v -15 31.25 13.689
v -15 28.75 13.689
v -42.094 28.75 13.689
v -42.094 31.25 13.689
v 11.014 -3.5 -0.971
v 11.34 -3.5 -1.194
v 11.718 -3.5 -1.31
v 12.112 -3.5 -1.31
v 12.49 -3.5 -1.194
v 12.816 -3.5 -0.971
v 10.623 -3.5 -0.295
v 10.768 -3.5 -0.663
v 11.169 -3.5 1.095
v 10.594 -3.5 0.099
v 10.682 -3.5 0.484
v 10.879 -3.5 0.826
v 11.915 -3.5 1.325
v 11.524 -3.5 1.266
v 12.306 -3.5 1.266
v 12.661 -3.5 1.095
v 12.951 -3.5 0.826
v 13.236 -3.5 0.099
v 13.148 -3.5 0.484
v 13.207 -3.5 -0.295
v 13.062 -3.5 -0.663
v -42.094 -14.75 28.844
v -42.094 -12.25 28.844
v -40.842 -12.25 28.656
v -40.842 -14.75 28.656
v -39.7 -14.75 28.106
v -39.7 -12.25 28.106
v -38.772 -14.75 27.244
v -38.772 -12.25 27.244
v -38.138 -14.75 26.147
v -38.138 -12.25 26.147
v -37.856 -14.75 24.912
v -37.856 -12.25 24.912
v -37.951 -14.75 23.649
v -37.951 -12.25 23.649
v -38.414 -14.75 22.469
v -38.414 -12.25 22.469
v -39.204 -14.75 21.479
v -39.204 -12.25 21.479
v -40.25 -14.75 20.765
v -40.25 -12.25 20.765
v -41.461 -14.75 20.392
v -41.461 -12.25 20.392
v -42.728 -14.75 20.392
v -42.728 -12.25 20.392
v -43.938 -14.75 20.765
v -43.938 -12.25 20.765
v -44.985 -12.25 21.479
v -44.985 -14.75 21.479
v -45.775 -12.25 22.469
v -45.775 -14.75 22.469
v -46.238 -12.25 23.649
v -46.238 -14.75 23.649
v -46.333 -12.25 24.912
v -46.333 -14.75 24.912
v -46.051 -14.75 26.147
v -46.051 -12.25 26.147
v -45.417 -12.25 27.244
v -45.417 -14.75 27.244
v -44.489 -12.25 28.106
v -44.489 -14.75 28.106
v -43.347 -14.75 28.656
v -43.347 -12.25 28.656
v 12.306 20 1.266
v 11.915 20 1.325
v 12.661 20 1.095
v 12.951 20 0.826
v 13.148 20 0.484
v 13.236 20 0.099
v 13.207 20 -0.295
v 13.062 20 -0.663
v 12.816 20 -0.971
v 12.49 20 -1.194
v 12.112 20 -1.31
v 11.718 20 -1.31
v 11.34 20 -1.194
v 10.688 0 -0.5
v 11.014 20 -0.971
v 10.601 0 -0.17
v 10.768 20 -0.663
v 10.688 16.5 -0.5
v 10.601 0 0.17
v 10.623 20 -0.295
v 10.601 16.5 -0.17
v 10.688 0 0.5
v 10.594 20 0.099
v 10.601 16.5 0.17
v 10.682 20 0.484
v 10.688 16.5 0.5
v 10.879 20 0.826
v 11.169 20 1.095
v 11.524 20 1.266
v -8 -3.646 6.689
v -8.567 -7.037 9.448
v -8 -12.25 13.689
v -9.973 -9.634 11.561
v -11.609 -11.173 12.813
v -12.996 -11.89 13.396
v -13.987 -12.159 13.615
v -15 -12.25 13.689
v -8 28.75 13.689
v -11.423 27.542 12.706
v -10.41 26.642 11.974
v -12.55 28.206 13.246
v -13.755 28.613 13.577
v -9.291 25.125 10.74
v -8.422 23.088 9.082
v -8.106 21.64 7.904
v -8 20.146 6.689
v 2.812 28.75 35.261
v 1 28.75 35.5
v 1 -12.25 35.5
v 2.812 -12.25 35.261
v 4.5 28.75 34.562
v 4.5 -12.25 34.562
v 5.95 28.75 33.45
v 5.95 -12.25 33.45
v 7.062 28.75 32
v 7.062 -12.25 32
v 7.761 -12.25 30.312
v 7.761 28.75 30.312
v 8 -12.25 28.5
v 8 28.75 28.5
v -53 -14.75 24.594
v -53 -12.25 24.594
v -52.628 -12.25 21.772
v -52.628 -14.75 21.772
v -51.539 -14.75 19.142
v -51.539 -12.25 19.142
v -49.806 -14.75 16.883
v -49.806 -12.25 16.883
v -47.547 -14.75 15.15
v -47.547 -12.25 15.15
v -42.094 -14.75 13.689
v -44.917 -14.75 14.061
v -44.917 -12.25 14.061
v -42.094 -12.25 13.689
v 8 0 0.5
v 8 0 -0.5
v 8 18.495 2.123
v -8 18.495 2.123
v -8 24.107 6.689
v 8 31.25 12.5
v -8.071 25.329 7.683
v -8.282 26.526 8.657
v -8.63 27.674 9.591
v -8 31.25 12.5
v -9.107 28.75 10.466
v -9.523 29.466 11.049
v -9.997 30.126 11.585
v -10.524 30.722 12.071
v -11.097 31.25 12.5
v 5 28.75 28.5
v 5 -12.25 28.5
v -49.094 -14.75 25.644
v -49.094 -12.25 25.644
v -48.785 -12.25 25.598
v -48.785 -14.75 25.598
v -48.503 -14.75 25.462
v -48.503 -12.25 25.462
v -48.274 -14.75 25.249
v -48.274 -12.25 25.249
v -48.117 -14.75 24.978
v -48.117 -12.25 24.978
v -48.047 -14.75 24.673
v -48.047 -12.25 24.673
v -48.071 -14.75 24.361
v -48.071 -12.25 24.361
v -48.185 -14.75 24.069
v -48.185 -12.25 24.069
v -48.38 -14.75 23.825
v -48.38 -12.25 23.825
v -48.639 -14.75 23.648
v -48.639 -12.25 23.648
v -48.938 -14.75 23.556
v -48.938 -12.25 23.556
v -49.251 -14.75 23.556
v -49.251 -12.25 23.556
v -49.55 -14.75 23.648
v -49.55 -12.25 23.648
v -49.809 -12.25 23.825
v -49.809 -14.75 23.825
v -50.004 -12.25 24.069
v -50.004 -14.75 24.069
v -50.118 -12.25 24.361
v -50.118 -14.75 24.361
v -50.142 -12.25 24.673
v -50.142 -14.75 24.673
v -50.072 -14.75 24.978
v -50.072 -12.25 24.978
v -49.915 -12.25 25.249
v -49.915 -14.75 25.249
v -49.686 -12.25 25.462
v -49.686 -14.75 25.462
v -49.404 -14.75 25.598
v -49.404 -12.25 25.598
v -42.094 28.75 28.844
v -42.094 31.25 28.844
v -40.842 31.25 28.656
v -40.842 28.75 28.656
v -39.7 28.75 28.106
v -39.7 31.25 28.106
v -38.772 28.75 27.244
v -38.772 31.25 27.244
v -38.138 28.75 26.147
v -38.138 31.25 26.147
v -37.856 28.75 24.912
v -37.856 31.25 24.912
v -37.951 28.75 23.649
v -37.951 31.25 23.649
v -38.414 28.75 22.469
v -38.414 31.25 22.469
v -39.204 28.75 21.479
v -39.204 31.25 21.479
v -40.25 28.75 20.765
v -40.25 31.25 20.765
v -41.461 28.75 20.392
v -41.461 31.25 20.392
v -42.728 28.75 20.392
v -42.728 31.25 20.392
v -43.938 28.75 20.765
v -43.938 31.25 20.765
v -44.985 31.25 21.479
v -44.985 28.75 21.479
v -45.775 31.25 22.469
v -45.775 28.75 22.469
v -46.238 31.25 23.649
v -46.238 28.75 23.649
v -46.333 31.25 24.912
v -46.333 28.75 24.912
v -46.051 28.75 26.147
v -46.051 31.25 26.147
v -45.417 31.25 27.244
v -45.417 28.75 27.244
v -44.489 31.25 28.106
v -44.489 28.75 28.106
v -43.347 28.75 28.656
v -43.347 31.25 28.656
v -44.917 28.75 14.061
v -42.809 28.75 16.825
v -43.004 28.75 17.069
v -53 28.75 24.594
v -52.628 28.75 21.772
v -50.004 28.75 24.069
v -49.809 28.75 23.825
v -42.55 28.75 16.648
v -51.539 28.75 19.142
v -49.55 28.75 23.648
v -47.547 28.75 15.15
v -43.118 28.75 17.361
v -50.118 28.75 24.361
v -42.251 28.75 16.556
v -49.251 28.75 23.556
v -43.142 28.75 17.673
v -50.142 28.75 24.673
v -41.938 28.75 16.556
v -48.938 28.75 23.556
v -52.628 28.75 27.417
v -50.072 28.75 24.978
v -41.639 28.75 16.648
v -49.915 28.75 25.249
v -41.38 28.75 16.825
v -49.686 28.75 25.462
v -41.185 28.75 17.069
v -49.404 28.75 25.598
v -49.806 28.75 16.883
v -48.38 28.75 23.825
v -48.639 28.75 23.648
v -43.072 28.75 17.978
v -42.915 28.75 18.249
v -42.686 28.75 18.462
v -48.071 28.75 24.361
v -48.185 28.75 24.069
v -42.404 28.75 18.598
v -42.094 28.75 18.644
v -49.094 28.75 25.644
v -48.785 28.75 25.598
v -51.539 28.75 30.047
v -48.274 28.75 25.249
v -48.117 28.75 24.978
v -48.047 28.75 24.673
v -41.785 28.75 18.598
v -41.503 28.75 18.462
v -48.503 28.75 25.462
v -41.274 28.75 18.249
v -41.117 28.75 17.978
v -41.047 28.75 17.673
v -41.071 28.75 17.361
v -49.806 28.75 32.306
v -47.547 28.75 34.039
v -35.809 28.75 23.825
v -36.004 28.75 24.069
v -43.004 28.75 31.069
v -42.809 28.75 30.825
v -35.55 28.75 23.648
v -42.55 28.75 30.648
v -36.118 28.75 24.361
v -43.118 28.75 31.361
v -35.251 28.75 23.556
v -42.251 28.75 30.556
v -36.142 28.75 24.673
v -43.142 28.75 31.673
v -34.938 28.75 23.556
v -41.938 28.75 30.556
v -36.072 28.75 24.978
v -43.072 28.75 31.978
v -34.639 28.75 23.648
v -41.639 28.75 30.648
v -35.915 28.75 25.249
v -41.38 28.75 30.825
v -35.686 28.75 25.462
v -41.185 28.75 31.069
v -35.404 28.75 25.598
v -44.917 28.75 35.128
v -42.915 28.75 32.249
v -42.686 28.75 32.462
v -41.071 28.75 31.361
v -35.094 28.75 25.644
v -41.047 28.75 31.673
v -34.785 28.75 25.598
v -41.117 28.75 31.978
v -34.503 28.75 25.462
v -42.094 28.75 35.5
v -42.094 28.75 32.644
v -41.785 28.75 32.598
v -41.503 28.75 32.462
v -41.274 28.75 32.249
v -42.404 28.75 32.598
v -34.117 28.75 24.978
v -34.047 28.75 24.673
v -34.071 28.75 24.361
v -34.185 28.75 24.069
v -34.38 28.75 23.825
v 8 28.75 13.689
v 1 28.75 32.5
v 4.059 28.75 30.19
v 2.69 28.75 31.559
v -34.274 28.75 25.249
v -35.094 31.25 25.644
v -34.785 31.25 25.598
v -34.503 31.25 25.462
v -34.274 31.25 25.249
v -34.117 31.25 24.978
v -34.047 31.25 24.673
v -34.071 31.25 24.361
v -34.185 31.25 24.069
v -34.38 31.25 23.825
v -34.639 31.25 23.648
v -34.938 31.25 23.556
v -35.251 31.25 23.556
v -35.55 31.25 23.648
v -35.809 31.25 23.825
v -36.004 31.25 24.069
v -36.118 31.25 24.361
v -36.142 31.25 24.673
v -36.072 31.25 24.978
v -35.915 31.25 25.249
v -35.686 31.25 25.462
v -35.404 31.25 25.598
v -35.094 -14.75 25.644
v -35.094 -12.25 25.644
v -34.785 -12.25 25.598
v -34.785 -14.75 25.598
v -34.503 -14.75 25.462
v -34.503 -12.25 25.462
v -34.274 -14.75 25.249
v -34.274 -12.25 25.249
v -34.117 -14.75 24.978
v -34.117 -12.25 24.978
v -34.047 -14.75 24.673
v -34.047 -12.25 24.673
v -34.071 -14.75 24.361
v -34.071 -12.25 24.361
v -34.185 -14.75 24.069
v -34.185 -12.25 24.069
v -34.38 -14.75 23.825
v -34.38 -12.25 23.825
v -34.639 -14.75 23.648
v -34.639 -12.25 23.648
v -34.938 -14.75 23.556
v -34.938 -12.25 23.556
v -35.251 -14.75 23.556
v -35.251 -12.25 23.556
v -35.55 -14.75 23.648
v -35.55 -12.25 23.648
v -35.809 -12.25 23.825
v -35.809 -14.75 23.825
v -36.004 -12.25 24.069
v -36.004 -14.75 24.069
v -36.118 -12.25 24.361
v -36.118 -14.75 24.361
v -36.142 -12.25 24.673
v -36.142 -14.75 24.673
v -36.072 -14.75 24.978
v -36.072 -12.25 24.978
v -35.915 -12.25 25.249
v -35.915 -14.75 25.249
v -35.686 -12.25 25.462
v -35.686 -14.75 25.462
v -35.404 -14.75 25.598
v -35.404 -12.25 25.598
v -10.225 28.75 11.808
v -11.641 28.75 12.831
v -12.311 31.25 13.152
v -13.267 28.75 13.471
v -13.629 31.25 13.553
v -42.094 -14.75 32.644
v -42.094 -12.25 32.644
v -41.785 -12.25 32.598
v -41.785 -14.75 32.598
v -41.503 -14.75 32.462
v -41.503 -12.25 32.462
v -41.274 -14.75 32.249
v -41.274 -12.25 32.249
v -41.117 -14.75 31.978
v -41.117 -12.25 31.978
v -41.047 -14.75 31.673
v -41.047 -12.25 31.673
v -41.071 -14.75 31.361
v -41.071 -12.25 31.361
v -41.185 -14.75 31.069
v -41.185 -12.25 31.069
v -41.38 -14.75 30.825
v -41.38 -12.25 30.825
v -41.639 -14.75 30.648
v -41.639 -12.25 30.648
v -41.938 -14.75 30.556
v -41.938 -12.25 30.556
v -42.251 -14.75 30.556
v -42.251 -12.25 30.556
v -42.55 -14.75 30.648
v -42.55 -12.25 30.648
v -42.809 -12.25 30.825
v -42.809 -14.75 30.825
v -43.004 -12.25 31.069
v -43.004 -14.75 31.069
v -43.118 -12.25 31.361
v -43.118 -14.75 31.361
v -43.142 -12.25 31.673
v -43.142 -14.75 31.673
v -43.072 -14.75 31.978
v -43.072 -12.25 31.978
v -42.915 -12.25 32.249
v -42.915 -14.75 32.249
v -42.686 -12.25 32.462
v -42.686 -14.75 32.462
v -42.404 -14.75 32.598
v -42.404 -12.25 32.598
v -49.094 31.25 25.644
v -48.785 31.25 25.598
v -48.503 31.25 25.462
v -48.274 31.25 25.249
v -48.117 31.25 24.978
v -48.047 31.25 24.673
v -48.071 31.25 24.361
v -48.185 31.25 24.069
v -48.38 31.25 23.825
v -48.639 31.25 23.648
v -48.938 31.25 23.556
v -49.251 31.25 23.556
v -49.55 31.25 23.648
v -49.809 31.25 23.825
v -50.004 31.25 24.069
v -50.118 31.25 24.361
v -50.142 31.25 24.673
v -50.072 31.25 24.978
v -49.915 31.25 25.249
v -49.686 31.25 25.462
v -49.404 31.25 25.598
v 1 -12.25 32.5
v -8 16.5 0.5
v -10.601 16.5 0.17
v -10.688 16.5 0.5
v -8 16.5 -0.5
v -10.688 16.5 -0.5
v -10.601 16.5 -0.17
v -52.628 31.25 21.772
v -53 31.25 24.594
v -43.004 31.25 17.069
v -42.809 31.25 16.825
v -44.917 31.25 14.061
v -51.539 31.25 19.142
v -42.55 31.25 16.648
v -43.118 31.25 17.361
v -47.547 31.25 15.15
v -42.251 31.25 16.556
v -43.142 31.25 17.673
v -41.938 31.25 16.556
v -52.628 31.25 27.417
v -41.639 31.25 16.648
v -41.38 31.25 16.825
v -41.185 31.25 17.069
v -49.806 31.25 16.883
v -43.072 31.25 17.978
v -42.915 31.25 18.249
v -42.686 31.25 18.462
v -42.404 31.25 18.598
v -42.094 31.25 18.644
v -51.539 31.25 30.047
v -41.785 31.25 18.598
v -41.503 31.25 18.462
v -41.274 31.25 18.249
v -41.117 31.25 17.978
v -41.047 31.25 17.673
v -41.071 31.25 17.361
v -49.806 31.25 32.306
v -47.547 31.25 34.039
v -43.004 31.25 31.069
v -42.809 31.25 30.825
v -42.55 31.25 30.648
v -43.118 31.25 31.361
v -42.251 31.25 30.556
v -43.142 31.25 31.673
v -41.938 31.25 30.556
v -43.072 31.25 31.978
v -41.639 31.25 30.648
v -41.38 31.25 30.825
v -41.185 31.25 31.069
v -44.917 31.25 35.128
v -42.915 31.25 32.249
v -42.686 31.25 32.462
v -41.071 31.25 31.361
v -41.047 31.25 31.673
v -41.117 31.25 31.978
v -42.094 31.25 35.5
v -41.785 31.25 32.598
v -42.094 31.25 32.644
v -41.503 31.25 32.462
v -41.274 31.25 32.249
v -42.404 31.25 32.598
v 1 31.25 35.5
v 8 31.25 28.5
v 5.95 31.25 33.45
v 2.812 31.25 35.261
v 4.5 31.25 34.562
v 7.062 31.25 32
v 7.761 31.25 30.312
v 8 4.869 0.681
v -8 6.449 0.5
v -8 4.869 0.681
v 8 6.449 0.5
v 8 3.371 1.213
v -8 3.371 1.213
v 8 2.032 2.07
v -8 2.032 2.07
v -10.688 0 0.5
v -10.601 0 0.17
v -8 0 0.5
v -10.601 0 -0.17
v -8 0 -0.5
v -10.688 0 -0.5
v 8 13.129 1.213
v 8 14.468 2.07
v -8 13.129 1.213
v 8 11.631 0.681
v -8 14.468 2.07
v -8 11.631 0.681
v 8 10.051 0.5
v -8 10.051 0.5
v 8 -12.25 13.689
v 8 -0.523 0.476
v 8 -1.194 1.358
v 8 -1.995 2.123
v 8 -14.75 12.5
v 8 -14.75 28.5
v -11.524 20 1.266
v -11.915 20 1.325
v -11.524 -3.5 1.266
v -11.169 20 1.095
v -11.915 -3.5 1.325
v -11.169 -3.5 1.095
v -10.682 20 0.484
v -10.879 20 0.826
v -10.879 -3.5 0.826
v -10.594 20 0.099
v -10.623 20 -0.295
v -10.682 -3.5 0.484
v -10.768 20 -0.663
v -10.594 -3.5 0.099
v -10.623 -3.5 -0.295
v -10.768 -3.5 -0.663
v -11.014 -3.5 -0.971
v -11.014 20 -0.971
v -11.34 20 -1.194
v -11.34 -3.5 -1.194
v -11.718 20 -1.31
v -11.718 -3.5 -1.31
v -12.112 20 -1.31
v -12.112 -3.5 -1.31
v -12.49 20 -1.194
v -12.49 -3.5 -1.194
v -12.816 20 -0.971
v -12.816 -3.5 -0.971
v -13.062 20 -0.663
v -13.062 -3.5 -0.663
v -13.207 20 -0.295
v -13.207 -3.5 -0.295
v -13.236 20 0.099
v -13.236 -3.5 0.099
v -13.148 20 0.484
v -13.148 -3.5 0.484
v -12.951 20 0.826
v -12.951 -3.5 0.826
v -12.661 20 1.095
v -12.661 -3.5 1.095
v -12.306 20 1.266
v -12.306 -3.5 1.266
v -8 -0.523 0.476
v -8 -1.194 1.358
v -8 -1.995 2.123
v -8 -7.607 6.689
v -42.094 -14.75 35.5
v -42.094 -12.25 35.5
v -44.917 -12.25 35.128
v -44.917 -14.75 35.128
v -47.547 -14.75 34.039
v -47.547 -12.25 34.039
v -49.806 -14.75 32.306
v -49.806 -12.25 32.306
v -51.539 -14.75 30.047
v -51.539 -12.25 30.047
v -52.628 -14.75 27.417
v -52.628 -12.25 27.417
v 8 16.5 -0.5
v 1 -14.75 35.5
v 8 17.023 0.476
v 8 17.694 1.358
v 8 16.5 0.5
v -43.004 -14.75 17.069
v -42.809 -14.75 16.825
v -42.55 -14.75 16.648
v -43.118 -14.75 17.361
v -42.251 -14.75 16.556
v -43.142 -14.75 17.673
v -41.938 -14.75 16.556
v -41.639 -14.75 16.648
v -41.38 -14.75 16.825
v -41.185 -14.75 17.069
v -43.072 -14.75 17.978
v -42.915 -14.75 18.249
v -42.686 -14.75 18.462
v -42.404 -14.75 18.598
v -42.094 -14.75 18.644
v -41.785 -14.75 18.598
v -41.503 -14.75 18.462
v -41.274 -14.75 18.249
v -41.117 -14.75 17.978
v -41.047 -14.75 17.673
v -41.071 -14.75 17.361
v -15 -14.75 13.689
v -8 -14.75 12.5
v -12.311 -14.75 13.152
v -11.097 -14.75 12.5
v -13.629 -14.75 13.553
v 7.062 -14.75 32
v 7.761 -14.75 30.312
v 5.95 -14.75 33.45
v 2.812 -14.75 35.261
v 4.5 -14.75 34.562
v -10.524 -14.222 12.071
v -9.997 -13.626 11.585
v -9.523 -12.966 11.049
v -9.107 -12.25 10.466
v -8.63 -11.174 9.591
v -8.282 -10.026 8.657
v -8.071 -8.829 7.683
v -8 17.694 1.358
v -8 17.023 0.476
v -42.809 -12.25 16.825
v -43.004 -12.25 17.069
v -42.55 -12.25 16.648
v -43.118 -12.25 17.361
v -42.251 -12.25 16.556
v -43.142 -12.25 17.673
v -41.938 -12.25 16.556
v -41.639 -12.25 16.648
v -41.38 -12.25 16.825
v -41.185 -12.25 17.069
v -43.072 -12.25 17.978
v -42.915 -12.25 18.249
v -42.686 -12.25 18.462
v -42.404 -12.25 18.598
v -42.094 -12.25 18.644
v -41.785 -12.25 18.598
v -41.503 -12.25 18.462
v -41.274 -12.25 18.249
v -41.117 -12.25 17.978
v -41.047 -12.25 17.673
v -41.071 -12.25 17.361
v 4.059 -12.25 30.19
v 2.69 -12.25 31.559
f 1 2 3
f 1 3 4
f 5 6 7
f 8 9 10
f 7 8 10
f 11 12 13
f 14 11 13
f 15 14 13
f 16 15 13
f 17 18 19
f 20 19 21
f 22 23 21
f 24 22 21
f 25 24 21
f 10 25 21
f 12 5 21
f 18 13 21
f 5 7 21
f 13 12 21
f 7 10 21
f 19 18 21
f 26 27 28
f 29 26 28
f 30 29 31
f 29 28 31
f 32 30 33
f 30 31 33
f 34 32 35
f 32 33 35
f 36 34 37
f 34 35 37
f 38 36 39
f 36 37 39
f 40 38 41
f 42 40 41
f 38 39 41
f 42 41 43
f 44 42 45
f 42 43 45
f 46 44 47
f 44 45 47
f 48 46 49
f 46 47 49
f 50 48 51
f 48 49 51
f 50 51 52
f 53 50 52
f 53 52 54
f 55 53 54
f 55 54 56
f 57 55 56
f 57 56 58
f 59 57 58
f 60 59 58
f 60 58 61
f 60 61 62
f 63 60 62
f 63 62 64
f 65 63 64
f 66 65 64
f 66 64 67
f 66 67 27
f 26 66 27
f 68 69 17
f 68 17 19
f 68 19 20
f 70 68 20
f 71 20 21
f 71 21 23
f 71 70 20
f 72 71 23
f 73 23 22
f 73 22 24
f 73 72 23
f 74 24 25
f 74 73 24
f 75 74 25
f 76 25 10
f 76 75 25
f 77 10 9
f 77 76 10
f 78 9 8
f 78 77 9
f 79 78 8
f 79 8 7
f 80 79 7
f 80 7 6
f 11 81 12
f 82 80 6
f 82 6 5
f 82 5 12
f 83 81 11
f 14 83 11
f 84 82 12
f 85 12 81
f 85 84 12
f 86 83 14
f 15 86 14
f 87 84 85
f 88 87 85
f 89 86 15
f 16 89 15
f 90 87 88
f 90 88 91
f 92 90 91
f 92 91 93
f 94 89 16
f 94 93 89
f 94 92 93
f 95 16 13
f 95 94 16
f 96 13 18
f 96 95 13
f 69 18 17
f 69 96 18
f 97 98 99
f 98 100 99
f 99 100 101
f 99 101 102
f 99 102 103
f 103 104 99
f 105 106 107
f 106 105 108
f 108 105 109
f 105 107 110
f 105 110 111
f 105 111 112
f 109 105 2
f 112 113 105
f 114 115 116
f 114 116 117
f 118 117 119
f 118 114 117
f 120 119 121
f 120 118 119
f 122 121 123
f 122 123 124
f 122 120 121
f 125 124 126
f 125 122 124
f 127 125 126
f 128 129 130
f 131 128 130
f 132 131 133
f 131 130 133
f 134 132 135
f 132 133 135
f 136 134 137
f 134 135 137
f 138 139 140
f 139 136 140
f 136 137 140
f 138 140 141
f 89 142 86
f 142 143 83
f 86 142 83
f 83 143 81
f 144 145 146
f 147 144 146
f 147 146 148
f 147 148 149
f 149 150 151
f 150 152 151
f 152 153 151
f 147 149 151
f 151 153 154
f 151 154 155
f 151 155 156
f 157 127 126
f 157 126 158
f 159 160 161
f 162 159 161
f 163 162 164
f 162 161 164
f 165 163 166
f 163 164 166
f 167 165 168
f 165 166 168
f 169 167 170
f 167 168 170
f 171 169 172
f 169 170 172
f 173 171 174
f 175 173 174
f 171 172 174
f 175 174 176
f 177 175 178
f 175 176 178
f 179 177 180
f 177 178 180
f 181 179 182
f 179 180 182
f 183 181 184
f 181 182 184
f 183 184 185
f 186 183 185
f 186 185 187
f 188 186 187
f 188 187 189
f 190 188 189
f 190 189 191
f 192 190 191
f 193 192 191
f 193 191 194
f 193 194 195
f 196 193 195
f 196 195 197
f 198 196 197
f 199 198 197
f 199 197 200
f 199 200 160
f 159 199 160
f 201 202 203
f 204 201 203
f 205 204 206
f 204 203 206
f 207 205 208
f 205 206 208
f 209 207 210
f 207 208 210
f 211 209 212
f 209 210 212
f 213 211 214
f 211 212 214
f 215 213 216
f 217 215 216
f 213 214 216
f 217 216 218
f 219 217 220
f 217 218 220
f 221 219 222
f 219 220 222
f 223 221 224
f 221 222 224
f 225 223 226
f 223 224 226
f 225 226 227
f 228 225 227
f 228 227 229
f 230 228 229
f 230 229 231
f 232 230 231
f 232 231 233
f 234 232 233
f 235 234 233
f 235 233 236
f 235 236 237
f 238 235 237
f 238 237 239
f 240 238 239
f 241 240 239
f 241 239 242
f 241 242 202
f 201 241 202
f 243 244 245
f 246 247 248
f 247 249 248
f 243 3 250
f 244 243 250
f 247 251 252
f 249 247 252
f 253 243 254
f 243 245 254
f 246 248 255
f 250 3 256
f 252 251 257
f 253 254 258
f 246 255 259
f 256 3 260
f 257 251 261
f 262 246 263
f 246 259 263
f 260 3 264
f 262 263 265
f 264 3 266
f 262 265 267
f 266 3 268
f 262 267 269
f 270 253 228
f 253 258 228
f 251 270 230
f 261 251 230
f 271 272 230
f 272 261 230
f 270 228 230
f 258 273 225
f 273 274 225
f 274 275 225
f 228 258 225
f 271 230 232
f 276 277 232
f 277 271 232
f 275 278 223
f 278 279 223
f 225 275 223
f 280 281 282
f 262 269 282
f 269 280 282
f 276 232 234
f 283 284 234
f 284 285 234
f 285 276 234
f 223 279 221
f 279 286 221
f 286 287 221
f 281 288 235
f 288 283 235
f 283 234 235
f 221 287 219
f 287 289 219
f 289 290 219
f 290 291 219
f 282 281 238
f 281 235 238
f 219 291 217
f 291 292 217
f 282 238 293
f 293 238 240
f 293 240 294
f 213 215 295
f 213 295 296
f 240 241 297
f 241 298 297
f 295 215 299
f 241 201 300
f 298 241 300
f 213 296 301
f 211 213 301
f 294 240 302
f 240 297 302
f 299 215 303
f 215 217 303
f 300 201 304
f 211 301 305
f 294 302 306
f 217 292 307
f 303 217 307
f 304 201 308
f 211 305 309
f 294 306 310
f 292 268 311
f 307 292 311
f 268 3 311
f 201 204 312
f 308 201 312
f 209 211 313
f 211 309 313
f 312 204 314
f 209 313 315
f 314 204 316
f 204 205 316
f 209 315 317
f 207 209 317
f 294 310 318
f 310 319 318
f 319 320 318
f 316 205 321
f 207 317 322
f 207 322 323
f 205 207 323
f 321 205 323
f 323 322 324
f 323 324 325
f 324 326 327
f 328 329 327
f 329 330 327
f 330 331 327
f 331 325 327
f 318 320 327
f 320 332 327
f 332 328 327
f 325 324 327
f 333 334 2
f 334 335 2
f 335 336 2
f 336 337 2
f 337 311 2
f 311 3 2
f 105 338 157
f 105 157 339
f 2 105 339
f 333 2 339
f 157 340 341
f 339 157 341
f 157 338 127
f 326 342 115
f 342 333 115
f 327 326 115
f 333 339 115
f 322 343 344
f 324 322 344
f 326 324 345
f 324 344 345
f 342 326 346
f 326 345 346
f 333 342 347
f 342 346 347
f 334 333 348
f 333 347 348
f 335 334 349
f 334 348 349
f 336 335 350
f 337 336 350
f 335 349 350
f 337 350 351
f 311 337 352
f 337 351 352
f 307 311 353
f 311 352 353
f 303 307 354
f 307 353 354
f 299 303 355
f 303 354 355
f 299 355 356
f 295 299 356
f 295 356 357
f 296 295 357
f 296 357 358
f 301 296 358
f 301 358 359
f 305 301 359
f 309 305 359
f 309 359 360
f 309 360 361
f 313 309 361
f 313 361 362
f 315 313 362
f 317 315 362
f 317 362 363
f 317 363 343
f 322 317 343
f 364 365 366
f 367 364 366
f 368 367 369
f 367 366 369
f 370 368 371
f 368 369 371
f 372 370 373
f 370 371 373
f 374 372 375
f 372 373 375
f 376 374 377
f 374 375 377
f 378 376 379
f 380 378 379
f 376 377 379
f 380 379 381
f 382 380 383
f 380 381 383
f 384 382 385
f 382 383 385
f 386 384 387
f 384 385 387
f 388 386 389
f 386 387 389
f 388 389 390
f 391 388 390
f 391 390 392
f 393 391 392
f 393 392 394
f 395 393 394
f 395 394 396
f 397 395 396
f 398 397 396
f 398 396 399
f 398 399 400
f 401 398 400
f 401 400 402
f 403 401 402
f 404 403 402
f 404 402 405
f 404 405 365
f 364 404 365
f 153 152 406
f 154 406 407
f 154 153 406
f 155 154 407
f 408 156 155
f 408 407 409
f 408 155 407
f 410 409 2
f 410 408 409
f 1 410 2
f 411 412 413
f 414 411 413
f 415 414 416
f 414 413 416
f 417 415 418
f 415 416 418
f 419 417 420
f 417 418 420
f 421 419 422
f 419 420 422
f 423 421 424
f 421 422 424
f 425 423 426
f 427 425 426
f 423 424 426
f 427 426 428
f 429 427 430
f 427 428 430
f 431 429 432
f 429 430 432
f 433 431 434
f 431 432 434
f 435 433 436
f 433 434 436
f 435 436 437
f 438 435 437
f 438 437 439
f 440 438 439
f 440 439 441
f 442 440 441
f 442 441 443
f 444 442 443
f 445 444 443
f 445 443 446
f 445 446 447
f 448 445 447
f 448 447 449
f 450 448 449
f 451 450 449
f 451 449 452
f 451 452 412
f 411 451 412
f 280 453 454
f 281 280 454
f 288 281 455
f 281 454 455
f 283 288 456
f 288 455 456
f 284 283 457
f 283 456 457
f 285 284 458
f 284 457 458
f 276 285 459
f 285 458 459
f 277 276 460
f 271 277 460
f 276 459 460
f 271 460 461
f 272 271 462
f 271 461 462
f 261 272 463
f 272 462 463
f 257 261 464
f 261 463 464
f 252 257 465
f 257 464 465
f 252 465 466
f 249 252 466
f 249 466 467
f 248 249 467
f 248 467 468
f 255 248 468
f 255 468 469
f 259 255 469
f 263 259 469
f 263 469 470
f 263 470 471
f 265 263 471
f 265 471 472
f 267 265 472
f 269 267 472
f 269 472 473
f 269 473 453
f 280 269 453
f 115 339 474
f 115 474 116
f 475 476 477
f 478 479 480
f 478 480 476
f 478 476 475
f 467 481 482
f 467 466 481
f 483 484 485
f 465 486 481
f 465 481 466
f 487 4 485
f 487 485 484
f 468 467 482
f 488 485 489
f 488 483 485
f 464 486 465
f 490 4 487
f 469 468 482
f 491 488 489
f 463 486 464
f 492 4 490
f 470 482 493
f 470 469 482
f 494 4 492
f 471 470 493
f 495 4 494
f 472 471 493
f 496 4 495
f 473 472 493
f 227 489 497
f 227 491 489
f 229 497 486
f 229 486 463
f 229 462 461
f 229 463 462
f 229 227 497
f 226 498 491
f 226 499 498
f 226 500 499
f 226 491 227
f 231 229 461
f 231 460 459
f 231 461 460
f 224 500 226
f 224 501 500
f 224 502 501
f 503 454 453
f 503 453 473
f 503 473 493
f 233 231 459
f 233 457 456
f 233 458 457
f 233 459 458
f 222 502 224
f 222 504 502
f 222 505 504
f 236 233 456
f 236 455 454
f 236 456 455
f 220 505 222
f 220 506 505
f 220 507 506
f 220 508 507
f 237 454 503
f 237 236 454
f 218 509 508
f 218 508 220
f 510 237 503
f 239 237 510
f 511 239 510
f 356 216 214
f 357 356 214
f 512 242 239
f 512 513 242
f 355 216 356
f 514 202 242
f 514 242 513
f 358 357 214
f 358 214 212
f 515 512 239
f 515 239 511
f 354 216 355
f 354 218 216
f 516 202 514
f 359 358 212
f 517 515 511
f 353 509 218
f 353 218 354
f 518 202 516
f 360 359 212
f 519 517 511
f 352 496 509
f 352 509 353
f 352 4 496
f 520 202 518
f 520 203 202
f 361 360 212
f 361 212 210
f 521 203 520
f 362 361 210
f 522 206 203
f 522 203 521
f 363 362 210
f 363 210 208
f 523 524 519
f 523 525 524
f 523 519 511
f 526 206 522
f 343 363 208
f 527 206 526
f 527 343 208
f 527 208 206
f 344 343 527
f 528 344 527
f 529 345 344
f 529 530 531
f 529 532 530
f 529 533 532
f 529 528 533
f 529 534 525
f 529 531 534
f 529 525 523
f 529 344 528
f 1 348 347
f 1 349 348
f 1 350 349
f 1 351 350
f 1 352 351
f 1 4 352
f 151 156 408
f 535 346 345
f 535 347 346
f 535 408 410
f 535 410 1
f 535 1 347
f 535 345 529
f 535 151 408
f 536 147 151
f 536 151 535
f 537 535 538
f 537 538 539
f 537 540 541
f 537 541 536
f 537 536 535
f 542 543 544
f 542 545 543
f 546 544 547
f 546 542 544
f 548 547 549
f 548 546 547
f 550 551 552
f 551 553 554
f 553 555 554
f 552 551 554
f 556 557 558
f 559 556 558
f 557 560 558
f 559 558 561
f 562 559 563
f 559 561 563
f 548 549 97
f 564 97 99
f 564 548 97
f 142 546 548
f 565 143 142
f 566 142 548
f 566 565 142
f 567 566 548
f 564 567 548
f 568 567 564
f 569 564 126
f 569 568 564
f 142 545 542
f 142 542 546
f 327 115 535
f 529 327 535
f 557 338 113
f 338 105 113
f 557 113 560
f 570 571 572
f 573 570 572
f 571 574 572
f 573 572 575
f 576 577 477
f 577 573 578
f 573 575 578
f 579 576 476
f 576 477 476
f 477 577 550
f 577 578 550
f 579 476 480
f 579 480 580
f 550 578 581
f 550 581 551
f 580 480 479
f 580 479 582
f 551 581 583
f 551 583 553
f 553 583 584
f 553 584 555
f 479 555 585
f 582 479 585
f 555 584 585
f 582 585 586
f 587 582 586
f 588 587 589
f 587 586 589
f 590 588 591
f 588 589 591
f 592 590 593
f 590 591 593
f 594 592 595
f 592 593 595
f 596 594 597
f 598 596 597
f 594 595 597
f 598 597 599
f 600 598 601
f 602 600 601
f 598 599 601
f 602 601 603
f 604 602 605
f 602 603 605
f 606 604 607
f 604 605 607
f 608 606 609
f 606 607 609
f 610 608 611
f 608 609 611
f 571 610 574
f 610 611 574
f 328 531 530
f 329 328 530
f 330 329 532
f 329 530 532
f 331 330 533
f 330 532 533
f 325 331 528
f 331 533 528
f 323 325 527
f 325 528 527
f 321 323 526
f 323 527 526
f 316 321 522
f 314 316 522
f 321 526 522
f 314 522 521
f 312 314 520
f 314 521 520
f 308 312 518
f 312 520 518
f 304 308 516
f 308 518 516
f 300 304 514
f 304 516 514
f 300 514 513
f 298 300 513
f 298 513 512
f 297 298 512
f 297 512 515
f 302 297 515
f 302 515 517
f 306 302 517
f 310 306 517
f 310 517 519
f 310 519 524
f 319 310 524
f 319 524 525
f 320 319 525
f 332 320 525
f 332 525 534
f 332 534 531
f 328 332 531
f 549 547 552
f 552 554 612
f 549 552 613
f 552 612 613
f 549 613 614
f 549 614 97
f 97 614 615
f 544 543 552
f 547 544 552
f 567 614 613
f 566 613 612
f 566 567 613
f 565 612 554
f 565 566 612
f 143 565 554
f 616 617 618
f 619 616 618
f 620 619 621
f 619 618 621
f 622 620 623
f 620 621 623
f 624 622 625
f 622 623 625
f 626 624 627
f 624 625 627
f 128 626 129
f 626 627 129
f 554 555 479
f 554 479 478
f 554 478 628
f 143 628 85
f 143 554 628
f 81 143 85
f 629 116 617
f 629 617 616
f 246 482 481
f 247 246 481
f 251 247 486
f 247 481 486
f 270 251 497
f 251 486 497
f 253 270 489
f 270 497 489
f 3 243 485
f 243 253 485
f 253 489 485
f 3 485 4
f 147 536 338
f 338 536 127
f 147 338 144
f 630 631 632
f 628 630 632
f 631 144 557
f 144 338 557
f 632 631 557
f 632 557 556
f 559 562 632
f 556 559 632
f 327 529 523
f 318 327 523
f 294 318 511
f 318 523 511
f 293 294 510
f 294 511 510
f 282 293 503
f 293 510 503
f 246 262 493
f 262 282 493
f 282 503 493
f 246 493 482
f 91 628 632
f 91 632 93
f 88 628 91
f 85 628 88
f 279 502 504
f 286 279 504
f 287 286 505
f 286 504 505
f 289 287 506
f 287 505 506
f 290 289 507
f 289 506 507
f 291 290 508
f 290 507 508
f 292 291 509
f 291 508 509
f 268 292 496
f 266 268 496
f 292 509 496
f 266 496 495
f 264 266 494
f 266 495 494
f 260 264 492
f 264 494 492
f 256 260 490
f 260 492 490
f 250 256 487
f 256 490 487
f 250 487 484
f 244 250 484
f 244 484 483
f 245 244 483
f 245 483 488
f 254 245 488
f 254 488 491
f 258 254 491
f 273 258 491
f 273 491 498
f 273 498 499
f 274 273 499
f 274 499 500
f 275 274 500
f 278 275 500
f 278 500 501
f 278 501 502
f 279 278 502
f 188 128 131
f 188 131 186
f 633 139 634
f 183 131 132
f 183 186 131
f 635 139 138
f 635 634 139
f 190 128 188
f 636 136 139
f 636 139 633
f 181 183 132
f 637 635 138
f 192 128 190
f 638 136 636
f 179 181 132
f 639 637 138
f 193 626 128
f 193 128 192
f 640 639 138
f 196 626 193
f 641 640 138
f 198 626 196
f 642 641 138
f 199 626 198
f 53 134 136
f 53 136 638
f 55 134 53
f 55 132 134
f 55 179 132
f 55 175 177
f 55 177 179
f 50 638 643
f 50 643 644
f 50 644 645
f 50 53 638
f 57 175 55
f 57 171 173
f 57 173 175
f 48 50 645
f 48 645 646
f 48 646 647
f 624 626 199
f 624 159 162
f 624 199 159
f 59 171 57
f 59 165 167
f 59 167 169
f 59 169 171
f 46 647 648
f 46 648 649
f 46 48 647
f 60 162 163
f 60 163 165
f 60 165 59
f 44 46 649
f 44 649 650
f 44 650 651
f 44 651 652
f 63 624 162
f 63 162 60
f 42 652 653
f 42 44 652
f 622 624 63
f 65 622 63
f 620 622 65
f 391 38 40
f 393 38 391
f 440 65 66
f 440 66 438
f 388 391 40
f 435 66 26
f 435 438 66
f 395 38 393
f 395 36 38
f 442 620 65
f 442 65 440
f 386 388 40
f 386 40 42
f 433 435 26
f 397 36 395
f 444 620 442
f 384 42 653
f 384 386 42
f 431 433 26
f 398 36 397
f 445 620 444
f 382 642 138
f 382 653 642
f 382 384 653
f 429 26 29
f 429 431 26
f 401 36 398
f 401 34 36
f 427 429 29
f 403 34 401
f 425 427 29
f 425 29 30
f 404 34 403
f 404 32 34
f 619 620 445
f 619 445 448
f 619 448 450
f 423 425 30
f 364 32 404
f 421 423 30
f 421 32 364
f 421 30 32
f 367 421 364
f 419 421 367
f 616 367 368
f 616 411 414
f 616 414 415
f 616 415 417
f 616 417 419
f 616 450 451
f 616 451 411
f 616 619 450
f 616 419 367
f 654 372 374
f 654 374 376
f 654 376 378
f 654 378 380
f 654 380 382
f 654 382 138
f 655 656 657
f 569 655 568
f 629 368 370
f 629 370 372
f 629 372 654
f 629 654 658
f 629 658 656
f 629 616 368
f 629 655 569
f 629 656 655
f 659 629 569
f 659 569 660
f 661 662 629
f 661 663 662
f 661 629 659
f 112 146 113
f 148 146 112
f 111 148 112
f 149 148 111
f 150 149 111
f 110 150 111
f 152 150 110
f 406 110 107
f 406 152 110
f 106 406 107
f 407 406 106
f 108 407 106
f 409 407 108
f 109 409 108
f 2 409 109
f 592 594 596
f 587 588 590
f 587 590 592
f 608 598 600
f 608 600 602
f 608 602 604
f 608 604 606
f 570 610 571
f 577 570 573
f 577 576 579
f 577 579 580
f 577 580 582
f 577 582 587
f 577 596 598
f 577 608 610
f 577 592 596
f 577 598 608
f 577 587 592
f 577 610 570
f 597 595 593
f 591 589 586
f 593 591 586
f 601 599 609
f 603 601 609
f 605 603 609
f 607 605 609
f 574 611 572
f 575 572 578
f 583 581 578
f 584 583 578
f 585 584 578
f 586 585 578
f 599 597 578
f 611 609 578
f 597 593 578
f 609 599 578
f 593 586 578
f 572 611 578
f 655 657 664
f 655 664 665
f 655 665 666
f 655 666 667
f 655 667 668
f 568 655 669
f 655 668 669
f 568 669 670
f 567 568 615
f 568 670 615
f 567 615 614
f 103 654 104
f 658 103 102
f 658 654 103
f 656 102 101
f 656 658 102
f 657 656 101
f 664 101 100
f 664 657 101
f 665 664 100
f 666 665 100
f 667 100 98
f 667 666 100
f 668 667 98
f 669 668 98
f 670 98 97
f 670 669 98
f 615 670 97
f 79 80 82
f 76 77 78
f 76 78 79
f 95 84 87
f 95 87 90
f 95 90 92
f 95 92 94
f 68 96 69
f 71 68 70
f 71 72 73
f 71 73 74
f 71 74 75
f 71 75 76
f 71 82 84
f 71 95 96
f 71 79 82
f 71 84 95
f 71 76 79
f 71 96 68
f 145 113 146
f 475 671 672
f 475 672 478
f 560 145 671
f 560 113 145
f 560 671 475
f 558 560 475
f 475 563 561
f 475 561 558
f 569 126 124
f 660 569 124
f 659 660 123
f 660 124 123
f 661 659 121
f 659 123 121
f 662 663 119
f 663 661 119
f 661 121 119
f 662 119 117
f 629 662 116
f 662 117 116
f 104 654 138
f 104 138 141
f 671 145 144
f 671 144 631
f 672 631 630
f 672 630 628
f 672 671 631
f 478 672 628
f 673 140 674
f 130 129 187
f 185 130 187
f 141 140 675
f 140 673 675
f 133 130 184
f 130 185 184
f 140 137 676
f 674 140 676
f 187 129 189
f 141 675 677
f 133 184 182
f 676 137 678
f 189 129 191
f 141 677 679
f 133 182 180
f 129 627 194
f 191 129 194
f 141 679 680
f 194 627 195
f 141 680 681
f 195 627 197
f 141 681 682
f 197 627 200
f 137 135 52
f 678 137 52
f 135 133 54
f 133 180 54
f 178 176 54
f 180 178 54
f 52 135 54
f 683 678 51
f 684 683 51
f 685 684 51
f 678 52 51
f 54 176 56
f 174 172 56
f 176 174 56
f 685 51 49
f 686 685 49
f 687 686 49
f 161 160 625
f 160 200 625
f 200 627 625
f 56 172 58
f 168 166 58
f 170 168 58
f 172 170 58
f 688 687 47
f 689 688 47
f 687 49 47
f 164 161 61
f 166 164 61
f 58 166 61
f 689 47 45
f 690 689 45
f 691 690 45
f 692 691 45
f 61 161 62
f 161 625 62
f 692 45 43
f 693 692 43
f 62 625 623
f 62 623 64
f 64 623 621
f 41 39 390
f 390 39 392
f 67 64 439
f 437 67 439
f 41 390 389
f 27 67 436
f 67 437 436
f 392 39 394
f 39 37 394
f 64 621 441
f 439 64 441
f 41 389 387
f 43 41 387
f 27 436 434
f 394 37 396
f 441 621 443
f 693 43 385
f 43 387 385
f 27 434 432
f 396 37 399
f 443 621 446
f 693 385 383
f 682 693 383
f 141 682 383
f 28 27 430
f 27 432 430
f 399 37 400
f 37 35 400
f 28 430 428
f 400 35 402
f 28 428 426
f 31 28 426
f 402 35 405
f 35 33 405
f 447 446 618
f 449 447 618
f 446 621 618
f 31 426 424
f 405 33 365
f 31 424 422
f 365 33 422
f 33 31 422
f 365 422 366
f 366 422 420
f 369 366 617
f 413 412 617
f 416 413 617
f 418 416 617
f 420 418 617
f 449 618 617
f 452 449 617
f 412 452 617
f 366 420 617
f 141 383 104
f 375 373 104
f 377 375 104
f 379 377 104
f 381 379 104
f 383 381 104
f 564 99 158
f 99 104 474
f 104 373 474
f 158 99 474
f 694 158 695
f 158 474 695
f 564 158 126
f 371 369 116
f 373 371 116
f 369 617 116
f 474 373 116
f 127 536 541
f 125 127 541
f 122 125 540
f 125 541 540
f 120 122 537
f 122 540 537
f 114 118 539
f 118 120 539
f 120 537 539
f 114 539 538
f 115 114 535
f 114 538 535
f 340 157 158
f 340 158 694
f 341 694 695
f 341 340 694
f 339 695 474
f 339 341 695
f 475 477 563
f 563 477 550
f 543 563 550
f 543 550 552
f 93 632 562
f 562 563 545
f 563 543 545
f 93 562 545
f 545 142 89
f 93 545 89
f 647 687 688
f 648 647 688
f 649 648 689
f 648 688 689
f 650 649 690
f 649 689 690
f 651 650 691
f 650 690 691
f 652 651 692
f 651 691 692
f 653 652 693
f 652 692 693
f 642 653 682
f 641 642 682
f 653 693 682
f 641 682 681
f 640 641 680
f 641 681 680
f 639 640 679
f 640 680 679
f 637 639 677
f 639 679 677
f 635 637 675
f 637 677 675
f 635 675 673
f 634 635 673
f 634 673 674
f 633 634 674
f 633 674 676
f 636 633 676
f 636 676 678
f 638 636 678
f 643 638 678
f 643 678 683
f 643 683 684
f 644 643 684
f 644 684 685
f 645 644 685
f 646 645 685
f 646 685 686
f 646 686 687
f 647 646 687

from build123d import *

# Parameters (mm, degrees)
SKETCH1_W           = 23.83
SKETCH1_H           = 1
BOSS_EXTRUDE1_DEPTH = 16.5
SKETCH2_R           = 1.325
BOSS_EXTRUDE2_DEPTH = 11.75
BOSS_EXTRUDE4_DEPTH = 8
SKETCH5_W           = 21.811051378
SKETCH5_H           = 2.5
BOSS_EXTRUDE5_DEPTH = 45
SKETCH6_R           = 4.25
SKETCH6_R_2         = 1.05
CUT_EXTRUDE1_DEPTH  = 79.646360374
FILLET1_R           = 7
FILLET2_R           = 7
FILLET3_R           = 7
BOSS_EXTRUDE6_START = 41
BOSS_EXTRUDE6_DEPTH = 41


with BuildPart() as part:
    # Sketch1 → Boss-Extrude1 (new body)
    with BuildSketch(Plane(origin=(0, 0, 0), x_dir=(1, 0, 0), z_dir=(0, 1, 0))):
        Rectangle(SKETCH1_W, SKETCH1_H)
    extrude(amount=BOSS_EXTRUDE1_DEPTH)

    # Sketch2 → Boss-Extrude2 (add, symmetric)
    with BuildSketch(Plane(origin=(0, 8.25, 0), x_dir=(1, 0, 0), z_dir=(0, 1, 0))):
        with Locations(Location((-11.915, 0, 0), (0, 0, 270))):
            Circle(SKETCH2_R)
        with Locations(Location((11.915, 0, 0), (0, 0, 270))):
            Circle(SKETCH2_R)
    extrude(amount=BOSS_EXTRUDE2_DEPTH, both=True)

    # Sketch4 → Boss-Extrude4 (add, symmetric)
    with BuildSketch(Plane(origin=(0, 0, 0), x_dir=(0, 0, -1), z_dir=(1, 0, 0))):
        Polygon((-0.5, 12.538583985), (-0.5, 16.5), (-12.5, 31.25), (-35.5, 31.25), (-35.5, 28.75), (-13.688948622, 28.75), align=None)
        Polygon((-0.5, 0), (-0.5, 3.961416015), (-13.688948622, -12.25), (-35.5, -12.25), (-35.5, -14.75), (-12.5, -14.75), align=None)
    extrude(amount=BOSS_EXTRUDE4_DEPTH, both=True)

    # Sketch5 → Boss-Extrude5 (add)
    with BuildSketch(Plane.ZY.offset(8)):
        with Locations((24.594474311, 30)):
            Rectangle(SKETCH5_W, SKETCH5_H)
        with Locations((24.594474311, -13.5)):
            Rectangle(SKETCH5_W, SKETCH5_H)
    extrude(amount=BOSS_EXTRUDE5_DEPTH)

    # Sketch6 → Cut-Extrude1 (cut, through all)
    with BuildSketch(Plane(origin=(0, 31.25, 0), x_dir=(1, 0, 0), z_dir=(0, 1, 0))):
        with Locations(Location((-42.094474311, -24.594474311, 0), (0, 0, 270))):
            Circle(SKETCH6_R)
        with Locations(Location((-49.094474311, -24.594474311, 0), (0, 0, 270))):
            Circle(SKETCH6_R_2)
        with Locations(Location((-42.094474311, -17.594474311, 0), (0, 0, 270))):
            Circle(SKETCH6_R_2)
        with Locations(Location((-35.094474311, -24.594474311, 0), (0, 0, 270))):
            Circle(SKETCH6_R_2)
        with Locations(Location((-42.094474311, -31.594474311, 0), (0, 0, 270))):
            Circle(SKETCH6_R_2)
        with BuildLine():
            ThreePointArc((-53, -24.594474311), (-49.805845478, -16.883103144), (-42.094474311, -13.688948622))
            Line((-42.094474311, -13.688948622), (-53, -13.688948622))
            Line((-53, -13.688948622), (-53, -24.594474311))
        make_face()
        with BuildLine():
            ThreePointArc((-42.094474311, -35.5), (-49.805845478, -32.305845478), (-53, -24.594474311))
            Line((-53, -24.594474311), (-53, -35.5))
            Line((-53, -35.5), (-42.094474311, -35.5))
        make_face()
    extrude(amount=-CUT_EXTRUDE1_DEPTH, mode=Mode.SUBTRACT)

    # Fillet1
    # the kernel refuses this fillet: 7 mm, written as the material it adds along each edge
    with BuildSketch(Plane(origin=(-8, -14.75, 13.688948622), x_dir=(-1, 0, 0), z_dir=(0, 1, 0))) as fillet1_piece_1_section:
        with BuildLine():
            CenterArc((FILLET1_R, -FILLET1_R), FILLET1_R, 90, 90)
            Line((0, -FILLET1_R), (0, 0))
            Line((0, 0), (FILLET1_R, 0))
        make_face()
    fillet1_piece_1 = extrude(amount=2.5, mode=Mode.PRIVATE)
    fillet1_piece_1 = split(fillet1_piece_1, bisect_by=Plane(origin=(-10.031790315, -14.125351158, 11.991811112), z_dir=(0, 0.6310874674162202, 0.7757116786991036)), keep=Keep.TOP, mode=Mode.PRIVATE)
    fillet1_piece_1 = split(fillet1_piece_1, bisect_by=Plane(origin=(-10.031790315, -12.54763249, 13.931090308), z_dir=(0, -0.6310874674162201, -0.7757116786991036)), keep=Keep.TOP, mode=Mode.PRIVATE)
    add(fillet1_piece_1)
    with BuildSketch(Plane(origin=(-8, -14.75, 13.688948622), x_dir=(-1, 0, 0), z_dir=(0, 1, 0))) as fillet1_piece_2_section:
        with BuildLine():
            CenterArc((FILLET1_R, -FILLET1_R), FILLET1_R, 90, 90)
            Line((0, -FILLET1_R), (0, 0))
            Line((0, 0), (FILLET1_R, 0))
        make_face()
    fillet1_piece_2 = extrude(amount=20, mode=Mode.PRIVATE)
    fillet1_piece_2 = split(fillet1_piece_2, bisect_by=Plane(origin=(-8.829123945, -11.325395044, 9.713880714), z_dir=(0, 0.6310874674162202, 0.7757116786991036)), keep=Keep.TOP, mode=Mode.PRIVATE)
    fillet1_piece_2 = split(fillet1_piece_2, bisect_by=Plane(origin=(-8.829123945, -12.25, 10.954048459), z_dir=(0, 1, 0)), keep=Keep.TOP, mode=Mode.PRIVATE)
    fillet1_piece_2 = split(fillet1_piece_2, bisect_by=Plane(origin=(-8.829123945, -9.747676376, 11.653159911), z_dir=(0, -0.6310874674162201, -0.7757116786991036)), keep=Keep.TOP, mode=Mode.PRIVATE)
    add(fillet1_piece_2)
    with BuildSketch(Plane(origin=(-8, 31.25, 13.688948622), x_dir=(0, 0, -1), z_dir=(0, -1, 0))) as fillet1_piece_3_section:
        with BuildLine():
            CenterArc((FILLET1_R, -FILLET1_R), FILLET1_R, 90, 90)
            Line((0, -FILLET1_R), (0, 0))
            Line((0, 0), (FILLET1_R, 0))
        make_face()
    fillet1_piece_3 = extrude(amount=2.5, mode=Mode.PRIVATE)
    fillet1_piece_3 = split(fillet1_piece_3, bisect_by=Plane(origin=(-10.031790315, 29.047632489, 13.931090308), z_dir=(0, 0.6310874674162203, -0.7757116786991034)), keep=Keep.TOP, mode=Mode.PRIVATE)
    fillet1_piece_3 = split(fillet1_piece_3, bisect_by=Plane(origin=(-10.031790315, 30.625351158, 11.991811112), z_dir=(0, -0.6310874674162202, 0.7757116786991036)), keep=Keep.TOP, mode=Mode.PRIVATE)
    add(fillet1_piece_3)
    with BuildSketch(Plane(origin=(-8, 31.25, 13.688948622), x_dir=(0, 0, -1), z_dir=(0, -1, 0))) as fillet1_piece_4_section:
        with BuildLine():
            CenterArc((FILLET1_R, -FILLET1_R), FILLET1_R, 90, 90)
            Line((0, -FILLET1_R), (0, 0))
            Line((0, 0), (FILLET1_R, 0))
        make_face()
    fillet1_piece_4 = extrude(amount=20, mode=Mode.PRIVATE)
    fillet1_piece_4 = split(fillet1_piece_4, bisect_by=Plane(origin=(-8.829123957, 26.247676381, 11.653159915), z_dir=(0, 0.6310874674162203, -0.7757116786991034)), keep=Keep.TOP, mode=Mode.PRIVATE)
    fillet1_piece_4 = split(fillet1_piece_4, bisect_by=Plane(origin=(-8.829123957, 27.82539505, 9.713880718), z_dir=(0, -0.6310874674162202, 0.7757116786991036)), keep=Keep.TOP, mode=Mode.PRIVATE)
    fillet1_piece_4 = split(fillet1_piece_4, bisect_by=Plane(origin=(-8.829123957, 28.75, 10.954048463), z_dir=(0, -1, 0)), keep=Keep.TOP, mode=Mode.PRIVATE)
    add(fillet1_piece_4)
    # the kernel refuses this fillet: 7 mm, written as the material it takes off along each edge
    with BuildSketch(Plane(origin=(8, 5.25, 35.5), x_dir=(0, 0, -1), z_dir=(0, -1, 0))) as fillet1_2_piece_1:
        with BuildLine():
            CenterArc((FILLET1_R, -FILLET1_R), FILLET1_R, 90, 90)
            Line((0, -FILLET1_R), (0, 0))
            Line((0, 0), (FILLET1_R, 0))
        make_face()
    extrude(amount=37.5, mode=Mode.SUBTRACT)
    with BuildSketch(Plane(origin=(8, 48.75, 35.5), x_dir=(-1, 0, 0), z_dir=(0, -1, 0))) as fillet1_2_piece_2:
        with BuildLine():
            CenterArc((FILLET1_R, FILLET1_R), FILLET1_R, 180, 90)
            Line((0, FILLET1_R), (0, 0))
            Line((0, 0), (FILLET1_R, 0))
        make_face()
    extrude(amount=37.5, mode=Mode.SUBTRACT)

    # Fillet2
    fillet2_edges = [part.edges().sort_by_distance(p)[0] for p in [
        (0, 12.538583985, 0.5),
        (0, 3.961416015, 0.5),
    ]]
    fillet(fillet2_edges, radius=FILLET2_R)

    # Fillet3
    # the kernel refuses this fillet: 7 mm, written as the material it adds along each edge
    with BuildSketch(Plane(origin=(-8, 16.5, 0.5), x_dir=(0, 0.7757116786988805, 0.6310874674164945), z_dir=(1, 0, 0))) as fillet3_piece_1:
        with BuildLine():
            CenterArc((2.571760467, -7), FILLET3_R, 90, 27.229107119)
            Line((-0.631087467, -0.775711679), (0, 0))
            Line((0, 0), (2.571760467, 0))
        make_face()
    extrude(amount=16)
    with BuildSketch(Plane(origin=(8, 0, 0.5), x_dir=(0, 0, -1), z_dir=(-1, 0, 0))) as fillet3_piece_2:
        with BuildLine():
            CenterArc((3.806975951, 6.412556901), FILLET3_R, 219.130399557, 27.229107119)
            Line((-1.6230058, 1.994944629), (0, 0))
            Line((0, 0), (1, 0))
        make_face()
    extrude(amount=16)

    # Sketch8 → Boss-Extrude6 (add)
    with BuildSketch(Plane(origin=(0, -12.25, 0), x_dir=(1, 0, 0), z_dir=(0, 1, 0)).offset(BOSS_EXTRUDE6_START)):
        with BuildLine():
            ThreePointArc((1, -35.5), (5.949747468, -33.449747468), (8, -28.5))
            Line((8, -28.5), (5, -28.5))
            ThreePointArc((5, -28.5), (3.422054899, -30.922054899), (1, -32.5))
            Line((1, -32.5), (1, -35.5))
        make_face()
    extrude(amount=-BOSS_EXTRUDE6_DEPTH)


solid = part.part
